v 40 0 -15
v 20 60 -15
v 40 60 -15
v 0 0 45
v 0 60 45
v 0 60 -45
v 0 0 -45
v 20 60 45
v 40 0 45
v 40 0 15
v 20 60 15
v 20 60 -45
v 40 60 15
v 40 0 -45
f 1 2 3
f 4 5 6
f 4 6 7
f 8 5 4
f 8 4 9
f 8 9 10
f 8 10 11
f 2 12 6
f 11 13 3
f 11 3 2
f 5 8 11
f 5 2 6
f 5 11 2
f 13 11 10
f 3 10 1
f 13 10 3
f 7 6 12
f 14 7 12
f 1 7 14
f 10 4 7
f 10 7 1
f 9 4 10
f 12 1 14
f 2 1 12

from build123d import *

# Parameters (mm, degrees)
BOSS_EXTRUDE1_DEPTH = 45
BOSS_EXTRUDE2_DEPTH = 15


with BuildPart() as part:
    # Sketch1 → Boss-Extrude1 (new, symmetric)
    with BuildSketch(Plane.XY):
        Polygon((40, 0), (20, 60), (0, 60), (0, 0), align=None)
    extrude(amount=BOSS_EXTRUDE1_DEPTH, both=True)

    # Sketch1<3> → Boss-Extrude2 (add, symmetric)
    with BuildSketch(Plane.XY):
        Polygon((40, 0), (40, 60), (20, 60), align=None)
    extrude(amount=BOSS_EXTRUDE2_DEPTH, both=True)


solid = part.part
